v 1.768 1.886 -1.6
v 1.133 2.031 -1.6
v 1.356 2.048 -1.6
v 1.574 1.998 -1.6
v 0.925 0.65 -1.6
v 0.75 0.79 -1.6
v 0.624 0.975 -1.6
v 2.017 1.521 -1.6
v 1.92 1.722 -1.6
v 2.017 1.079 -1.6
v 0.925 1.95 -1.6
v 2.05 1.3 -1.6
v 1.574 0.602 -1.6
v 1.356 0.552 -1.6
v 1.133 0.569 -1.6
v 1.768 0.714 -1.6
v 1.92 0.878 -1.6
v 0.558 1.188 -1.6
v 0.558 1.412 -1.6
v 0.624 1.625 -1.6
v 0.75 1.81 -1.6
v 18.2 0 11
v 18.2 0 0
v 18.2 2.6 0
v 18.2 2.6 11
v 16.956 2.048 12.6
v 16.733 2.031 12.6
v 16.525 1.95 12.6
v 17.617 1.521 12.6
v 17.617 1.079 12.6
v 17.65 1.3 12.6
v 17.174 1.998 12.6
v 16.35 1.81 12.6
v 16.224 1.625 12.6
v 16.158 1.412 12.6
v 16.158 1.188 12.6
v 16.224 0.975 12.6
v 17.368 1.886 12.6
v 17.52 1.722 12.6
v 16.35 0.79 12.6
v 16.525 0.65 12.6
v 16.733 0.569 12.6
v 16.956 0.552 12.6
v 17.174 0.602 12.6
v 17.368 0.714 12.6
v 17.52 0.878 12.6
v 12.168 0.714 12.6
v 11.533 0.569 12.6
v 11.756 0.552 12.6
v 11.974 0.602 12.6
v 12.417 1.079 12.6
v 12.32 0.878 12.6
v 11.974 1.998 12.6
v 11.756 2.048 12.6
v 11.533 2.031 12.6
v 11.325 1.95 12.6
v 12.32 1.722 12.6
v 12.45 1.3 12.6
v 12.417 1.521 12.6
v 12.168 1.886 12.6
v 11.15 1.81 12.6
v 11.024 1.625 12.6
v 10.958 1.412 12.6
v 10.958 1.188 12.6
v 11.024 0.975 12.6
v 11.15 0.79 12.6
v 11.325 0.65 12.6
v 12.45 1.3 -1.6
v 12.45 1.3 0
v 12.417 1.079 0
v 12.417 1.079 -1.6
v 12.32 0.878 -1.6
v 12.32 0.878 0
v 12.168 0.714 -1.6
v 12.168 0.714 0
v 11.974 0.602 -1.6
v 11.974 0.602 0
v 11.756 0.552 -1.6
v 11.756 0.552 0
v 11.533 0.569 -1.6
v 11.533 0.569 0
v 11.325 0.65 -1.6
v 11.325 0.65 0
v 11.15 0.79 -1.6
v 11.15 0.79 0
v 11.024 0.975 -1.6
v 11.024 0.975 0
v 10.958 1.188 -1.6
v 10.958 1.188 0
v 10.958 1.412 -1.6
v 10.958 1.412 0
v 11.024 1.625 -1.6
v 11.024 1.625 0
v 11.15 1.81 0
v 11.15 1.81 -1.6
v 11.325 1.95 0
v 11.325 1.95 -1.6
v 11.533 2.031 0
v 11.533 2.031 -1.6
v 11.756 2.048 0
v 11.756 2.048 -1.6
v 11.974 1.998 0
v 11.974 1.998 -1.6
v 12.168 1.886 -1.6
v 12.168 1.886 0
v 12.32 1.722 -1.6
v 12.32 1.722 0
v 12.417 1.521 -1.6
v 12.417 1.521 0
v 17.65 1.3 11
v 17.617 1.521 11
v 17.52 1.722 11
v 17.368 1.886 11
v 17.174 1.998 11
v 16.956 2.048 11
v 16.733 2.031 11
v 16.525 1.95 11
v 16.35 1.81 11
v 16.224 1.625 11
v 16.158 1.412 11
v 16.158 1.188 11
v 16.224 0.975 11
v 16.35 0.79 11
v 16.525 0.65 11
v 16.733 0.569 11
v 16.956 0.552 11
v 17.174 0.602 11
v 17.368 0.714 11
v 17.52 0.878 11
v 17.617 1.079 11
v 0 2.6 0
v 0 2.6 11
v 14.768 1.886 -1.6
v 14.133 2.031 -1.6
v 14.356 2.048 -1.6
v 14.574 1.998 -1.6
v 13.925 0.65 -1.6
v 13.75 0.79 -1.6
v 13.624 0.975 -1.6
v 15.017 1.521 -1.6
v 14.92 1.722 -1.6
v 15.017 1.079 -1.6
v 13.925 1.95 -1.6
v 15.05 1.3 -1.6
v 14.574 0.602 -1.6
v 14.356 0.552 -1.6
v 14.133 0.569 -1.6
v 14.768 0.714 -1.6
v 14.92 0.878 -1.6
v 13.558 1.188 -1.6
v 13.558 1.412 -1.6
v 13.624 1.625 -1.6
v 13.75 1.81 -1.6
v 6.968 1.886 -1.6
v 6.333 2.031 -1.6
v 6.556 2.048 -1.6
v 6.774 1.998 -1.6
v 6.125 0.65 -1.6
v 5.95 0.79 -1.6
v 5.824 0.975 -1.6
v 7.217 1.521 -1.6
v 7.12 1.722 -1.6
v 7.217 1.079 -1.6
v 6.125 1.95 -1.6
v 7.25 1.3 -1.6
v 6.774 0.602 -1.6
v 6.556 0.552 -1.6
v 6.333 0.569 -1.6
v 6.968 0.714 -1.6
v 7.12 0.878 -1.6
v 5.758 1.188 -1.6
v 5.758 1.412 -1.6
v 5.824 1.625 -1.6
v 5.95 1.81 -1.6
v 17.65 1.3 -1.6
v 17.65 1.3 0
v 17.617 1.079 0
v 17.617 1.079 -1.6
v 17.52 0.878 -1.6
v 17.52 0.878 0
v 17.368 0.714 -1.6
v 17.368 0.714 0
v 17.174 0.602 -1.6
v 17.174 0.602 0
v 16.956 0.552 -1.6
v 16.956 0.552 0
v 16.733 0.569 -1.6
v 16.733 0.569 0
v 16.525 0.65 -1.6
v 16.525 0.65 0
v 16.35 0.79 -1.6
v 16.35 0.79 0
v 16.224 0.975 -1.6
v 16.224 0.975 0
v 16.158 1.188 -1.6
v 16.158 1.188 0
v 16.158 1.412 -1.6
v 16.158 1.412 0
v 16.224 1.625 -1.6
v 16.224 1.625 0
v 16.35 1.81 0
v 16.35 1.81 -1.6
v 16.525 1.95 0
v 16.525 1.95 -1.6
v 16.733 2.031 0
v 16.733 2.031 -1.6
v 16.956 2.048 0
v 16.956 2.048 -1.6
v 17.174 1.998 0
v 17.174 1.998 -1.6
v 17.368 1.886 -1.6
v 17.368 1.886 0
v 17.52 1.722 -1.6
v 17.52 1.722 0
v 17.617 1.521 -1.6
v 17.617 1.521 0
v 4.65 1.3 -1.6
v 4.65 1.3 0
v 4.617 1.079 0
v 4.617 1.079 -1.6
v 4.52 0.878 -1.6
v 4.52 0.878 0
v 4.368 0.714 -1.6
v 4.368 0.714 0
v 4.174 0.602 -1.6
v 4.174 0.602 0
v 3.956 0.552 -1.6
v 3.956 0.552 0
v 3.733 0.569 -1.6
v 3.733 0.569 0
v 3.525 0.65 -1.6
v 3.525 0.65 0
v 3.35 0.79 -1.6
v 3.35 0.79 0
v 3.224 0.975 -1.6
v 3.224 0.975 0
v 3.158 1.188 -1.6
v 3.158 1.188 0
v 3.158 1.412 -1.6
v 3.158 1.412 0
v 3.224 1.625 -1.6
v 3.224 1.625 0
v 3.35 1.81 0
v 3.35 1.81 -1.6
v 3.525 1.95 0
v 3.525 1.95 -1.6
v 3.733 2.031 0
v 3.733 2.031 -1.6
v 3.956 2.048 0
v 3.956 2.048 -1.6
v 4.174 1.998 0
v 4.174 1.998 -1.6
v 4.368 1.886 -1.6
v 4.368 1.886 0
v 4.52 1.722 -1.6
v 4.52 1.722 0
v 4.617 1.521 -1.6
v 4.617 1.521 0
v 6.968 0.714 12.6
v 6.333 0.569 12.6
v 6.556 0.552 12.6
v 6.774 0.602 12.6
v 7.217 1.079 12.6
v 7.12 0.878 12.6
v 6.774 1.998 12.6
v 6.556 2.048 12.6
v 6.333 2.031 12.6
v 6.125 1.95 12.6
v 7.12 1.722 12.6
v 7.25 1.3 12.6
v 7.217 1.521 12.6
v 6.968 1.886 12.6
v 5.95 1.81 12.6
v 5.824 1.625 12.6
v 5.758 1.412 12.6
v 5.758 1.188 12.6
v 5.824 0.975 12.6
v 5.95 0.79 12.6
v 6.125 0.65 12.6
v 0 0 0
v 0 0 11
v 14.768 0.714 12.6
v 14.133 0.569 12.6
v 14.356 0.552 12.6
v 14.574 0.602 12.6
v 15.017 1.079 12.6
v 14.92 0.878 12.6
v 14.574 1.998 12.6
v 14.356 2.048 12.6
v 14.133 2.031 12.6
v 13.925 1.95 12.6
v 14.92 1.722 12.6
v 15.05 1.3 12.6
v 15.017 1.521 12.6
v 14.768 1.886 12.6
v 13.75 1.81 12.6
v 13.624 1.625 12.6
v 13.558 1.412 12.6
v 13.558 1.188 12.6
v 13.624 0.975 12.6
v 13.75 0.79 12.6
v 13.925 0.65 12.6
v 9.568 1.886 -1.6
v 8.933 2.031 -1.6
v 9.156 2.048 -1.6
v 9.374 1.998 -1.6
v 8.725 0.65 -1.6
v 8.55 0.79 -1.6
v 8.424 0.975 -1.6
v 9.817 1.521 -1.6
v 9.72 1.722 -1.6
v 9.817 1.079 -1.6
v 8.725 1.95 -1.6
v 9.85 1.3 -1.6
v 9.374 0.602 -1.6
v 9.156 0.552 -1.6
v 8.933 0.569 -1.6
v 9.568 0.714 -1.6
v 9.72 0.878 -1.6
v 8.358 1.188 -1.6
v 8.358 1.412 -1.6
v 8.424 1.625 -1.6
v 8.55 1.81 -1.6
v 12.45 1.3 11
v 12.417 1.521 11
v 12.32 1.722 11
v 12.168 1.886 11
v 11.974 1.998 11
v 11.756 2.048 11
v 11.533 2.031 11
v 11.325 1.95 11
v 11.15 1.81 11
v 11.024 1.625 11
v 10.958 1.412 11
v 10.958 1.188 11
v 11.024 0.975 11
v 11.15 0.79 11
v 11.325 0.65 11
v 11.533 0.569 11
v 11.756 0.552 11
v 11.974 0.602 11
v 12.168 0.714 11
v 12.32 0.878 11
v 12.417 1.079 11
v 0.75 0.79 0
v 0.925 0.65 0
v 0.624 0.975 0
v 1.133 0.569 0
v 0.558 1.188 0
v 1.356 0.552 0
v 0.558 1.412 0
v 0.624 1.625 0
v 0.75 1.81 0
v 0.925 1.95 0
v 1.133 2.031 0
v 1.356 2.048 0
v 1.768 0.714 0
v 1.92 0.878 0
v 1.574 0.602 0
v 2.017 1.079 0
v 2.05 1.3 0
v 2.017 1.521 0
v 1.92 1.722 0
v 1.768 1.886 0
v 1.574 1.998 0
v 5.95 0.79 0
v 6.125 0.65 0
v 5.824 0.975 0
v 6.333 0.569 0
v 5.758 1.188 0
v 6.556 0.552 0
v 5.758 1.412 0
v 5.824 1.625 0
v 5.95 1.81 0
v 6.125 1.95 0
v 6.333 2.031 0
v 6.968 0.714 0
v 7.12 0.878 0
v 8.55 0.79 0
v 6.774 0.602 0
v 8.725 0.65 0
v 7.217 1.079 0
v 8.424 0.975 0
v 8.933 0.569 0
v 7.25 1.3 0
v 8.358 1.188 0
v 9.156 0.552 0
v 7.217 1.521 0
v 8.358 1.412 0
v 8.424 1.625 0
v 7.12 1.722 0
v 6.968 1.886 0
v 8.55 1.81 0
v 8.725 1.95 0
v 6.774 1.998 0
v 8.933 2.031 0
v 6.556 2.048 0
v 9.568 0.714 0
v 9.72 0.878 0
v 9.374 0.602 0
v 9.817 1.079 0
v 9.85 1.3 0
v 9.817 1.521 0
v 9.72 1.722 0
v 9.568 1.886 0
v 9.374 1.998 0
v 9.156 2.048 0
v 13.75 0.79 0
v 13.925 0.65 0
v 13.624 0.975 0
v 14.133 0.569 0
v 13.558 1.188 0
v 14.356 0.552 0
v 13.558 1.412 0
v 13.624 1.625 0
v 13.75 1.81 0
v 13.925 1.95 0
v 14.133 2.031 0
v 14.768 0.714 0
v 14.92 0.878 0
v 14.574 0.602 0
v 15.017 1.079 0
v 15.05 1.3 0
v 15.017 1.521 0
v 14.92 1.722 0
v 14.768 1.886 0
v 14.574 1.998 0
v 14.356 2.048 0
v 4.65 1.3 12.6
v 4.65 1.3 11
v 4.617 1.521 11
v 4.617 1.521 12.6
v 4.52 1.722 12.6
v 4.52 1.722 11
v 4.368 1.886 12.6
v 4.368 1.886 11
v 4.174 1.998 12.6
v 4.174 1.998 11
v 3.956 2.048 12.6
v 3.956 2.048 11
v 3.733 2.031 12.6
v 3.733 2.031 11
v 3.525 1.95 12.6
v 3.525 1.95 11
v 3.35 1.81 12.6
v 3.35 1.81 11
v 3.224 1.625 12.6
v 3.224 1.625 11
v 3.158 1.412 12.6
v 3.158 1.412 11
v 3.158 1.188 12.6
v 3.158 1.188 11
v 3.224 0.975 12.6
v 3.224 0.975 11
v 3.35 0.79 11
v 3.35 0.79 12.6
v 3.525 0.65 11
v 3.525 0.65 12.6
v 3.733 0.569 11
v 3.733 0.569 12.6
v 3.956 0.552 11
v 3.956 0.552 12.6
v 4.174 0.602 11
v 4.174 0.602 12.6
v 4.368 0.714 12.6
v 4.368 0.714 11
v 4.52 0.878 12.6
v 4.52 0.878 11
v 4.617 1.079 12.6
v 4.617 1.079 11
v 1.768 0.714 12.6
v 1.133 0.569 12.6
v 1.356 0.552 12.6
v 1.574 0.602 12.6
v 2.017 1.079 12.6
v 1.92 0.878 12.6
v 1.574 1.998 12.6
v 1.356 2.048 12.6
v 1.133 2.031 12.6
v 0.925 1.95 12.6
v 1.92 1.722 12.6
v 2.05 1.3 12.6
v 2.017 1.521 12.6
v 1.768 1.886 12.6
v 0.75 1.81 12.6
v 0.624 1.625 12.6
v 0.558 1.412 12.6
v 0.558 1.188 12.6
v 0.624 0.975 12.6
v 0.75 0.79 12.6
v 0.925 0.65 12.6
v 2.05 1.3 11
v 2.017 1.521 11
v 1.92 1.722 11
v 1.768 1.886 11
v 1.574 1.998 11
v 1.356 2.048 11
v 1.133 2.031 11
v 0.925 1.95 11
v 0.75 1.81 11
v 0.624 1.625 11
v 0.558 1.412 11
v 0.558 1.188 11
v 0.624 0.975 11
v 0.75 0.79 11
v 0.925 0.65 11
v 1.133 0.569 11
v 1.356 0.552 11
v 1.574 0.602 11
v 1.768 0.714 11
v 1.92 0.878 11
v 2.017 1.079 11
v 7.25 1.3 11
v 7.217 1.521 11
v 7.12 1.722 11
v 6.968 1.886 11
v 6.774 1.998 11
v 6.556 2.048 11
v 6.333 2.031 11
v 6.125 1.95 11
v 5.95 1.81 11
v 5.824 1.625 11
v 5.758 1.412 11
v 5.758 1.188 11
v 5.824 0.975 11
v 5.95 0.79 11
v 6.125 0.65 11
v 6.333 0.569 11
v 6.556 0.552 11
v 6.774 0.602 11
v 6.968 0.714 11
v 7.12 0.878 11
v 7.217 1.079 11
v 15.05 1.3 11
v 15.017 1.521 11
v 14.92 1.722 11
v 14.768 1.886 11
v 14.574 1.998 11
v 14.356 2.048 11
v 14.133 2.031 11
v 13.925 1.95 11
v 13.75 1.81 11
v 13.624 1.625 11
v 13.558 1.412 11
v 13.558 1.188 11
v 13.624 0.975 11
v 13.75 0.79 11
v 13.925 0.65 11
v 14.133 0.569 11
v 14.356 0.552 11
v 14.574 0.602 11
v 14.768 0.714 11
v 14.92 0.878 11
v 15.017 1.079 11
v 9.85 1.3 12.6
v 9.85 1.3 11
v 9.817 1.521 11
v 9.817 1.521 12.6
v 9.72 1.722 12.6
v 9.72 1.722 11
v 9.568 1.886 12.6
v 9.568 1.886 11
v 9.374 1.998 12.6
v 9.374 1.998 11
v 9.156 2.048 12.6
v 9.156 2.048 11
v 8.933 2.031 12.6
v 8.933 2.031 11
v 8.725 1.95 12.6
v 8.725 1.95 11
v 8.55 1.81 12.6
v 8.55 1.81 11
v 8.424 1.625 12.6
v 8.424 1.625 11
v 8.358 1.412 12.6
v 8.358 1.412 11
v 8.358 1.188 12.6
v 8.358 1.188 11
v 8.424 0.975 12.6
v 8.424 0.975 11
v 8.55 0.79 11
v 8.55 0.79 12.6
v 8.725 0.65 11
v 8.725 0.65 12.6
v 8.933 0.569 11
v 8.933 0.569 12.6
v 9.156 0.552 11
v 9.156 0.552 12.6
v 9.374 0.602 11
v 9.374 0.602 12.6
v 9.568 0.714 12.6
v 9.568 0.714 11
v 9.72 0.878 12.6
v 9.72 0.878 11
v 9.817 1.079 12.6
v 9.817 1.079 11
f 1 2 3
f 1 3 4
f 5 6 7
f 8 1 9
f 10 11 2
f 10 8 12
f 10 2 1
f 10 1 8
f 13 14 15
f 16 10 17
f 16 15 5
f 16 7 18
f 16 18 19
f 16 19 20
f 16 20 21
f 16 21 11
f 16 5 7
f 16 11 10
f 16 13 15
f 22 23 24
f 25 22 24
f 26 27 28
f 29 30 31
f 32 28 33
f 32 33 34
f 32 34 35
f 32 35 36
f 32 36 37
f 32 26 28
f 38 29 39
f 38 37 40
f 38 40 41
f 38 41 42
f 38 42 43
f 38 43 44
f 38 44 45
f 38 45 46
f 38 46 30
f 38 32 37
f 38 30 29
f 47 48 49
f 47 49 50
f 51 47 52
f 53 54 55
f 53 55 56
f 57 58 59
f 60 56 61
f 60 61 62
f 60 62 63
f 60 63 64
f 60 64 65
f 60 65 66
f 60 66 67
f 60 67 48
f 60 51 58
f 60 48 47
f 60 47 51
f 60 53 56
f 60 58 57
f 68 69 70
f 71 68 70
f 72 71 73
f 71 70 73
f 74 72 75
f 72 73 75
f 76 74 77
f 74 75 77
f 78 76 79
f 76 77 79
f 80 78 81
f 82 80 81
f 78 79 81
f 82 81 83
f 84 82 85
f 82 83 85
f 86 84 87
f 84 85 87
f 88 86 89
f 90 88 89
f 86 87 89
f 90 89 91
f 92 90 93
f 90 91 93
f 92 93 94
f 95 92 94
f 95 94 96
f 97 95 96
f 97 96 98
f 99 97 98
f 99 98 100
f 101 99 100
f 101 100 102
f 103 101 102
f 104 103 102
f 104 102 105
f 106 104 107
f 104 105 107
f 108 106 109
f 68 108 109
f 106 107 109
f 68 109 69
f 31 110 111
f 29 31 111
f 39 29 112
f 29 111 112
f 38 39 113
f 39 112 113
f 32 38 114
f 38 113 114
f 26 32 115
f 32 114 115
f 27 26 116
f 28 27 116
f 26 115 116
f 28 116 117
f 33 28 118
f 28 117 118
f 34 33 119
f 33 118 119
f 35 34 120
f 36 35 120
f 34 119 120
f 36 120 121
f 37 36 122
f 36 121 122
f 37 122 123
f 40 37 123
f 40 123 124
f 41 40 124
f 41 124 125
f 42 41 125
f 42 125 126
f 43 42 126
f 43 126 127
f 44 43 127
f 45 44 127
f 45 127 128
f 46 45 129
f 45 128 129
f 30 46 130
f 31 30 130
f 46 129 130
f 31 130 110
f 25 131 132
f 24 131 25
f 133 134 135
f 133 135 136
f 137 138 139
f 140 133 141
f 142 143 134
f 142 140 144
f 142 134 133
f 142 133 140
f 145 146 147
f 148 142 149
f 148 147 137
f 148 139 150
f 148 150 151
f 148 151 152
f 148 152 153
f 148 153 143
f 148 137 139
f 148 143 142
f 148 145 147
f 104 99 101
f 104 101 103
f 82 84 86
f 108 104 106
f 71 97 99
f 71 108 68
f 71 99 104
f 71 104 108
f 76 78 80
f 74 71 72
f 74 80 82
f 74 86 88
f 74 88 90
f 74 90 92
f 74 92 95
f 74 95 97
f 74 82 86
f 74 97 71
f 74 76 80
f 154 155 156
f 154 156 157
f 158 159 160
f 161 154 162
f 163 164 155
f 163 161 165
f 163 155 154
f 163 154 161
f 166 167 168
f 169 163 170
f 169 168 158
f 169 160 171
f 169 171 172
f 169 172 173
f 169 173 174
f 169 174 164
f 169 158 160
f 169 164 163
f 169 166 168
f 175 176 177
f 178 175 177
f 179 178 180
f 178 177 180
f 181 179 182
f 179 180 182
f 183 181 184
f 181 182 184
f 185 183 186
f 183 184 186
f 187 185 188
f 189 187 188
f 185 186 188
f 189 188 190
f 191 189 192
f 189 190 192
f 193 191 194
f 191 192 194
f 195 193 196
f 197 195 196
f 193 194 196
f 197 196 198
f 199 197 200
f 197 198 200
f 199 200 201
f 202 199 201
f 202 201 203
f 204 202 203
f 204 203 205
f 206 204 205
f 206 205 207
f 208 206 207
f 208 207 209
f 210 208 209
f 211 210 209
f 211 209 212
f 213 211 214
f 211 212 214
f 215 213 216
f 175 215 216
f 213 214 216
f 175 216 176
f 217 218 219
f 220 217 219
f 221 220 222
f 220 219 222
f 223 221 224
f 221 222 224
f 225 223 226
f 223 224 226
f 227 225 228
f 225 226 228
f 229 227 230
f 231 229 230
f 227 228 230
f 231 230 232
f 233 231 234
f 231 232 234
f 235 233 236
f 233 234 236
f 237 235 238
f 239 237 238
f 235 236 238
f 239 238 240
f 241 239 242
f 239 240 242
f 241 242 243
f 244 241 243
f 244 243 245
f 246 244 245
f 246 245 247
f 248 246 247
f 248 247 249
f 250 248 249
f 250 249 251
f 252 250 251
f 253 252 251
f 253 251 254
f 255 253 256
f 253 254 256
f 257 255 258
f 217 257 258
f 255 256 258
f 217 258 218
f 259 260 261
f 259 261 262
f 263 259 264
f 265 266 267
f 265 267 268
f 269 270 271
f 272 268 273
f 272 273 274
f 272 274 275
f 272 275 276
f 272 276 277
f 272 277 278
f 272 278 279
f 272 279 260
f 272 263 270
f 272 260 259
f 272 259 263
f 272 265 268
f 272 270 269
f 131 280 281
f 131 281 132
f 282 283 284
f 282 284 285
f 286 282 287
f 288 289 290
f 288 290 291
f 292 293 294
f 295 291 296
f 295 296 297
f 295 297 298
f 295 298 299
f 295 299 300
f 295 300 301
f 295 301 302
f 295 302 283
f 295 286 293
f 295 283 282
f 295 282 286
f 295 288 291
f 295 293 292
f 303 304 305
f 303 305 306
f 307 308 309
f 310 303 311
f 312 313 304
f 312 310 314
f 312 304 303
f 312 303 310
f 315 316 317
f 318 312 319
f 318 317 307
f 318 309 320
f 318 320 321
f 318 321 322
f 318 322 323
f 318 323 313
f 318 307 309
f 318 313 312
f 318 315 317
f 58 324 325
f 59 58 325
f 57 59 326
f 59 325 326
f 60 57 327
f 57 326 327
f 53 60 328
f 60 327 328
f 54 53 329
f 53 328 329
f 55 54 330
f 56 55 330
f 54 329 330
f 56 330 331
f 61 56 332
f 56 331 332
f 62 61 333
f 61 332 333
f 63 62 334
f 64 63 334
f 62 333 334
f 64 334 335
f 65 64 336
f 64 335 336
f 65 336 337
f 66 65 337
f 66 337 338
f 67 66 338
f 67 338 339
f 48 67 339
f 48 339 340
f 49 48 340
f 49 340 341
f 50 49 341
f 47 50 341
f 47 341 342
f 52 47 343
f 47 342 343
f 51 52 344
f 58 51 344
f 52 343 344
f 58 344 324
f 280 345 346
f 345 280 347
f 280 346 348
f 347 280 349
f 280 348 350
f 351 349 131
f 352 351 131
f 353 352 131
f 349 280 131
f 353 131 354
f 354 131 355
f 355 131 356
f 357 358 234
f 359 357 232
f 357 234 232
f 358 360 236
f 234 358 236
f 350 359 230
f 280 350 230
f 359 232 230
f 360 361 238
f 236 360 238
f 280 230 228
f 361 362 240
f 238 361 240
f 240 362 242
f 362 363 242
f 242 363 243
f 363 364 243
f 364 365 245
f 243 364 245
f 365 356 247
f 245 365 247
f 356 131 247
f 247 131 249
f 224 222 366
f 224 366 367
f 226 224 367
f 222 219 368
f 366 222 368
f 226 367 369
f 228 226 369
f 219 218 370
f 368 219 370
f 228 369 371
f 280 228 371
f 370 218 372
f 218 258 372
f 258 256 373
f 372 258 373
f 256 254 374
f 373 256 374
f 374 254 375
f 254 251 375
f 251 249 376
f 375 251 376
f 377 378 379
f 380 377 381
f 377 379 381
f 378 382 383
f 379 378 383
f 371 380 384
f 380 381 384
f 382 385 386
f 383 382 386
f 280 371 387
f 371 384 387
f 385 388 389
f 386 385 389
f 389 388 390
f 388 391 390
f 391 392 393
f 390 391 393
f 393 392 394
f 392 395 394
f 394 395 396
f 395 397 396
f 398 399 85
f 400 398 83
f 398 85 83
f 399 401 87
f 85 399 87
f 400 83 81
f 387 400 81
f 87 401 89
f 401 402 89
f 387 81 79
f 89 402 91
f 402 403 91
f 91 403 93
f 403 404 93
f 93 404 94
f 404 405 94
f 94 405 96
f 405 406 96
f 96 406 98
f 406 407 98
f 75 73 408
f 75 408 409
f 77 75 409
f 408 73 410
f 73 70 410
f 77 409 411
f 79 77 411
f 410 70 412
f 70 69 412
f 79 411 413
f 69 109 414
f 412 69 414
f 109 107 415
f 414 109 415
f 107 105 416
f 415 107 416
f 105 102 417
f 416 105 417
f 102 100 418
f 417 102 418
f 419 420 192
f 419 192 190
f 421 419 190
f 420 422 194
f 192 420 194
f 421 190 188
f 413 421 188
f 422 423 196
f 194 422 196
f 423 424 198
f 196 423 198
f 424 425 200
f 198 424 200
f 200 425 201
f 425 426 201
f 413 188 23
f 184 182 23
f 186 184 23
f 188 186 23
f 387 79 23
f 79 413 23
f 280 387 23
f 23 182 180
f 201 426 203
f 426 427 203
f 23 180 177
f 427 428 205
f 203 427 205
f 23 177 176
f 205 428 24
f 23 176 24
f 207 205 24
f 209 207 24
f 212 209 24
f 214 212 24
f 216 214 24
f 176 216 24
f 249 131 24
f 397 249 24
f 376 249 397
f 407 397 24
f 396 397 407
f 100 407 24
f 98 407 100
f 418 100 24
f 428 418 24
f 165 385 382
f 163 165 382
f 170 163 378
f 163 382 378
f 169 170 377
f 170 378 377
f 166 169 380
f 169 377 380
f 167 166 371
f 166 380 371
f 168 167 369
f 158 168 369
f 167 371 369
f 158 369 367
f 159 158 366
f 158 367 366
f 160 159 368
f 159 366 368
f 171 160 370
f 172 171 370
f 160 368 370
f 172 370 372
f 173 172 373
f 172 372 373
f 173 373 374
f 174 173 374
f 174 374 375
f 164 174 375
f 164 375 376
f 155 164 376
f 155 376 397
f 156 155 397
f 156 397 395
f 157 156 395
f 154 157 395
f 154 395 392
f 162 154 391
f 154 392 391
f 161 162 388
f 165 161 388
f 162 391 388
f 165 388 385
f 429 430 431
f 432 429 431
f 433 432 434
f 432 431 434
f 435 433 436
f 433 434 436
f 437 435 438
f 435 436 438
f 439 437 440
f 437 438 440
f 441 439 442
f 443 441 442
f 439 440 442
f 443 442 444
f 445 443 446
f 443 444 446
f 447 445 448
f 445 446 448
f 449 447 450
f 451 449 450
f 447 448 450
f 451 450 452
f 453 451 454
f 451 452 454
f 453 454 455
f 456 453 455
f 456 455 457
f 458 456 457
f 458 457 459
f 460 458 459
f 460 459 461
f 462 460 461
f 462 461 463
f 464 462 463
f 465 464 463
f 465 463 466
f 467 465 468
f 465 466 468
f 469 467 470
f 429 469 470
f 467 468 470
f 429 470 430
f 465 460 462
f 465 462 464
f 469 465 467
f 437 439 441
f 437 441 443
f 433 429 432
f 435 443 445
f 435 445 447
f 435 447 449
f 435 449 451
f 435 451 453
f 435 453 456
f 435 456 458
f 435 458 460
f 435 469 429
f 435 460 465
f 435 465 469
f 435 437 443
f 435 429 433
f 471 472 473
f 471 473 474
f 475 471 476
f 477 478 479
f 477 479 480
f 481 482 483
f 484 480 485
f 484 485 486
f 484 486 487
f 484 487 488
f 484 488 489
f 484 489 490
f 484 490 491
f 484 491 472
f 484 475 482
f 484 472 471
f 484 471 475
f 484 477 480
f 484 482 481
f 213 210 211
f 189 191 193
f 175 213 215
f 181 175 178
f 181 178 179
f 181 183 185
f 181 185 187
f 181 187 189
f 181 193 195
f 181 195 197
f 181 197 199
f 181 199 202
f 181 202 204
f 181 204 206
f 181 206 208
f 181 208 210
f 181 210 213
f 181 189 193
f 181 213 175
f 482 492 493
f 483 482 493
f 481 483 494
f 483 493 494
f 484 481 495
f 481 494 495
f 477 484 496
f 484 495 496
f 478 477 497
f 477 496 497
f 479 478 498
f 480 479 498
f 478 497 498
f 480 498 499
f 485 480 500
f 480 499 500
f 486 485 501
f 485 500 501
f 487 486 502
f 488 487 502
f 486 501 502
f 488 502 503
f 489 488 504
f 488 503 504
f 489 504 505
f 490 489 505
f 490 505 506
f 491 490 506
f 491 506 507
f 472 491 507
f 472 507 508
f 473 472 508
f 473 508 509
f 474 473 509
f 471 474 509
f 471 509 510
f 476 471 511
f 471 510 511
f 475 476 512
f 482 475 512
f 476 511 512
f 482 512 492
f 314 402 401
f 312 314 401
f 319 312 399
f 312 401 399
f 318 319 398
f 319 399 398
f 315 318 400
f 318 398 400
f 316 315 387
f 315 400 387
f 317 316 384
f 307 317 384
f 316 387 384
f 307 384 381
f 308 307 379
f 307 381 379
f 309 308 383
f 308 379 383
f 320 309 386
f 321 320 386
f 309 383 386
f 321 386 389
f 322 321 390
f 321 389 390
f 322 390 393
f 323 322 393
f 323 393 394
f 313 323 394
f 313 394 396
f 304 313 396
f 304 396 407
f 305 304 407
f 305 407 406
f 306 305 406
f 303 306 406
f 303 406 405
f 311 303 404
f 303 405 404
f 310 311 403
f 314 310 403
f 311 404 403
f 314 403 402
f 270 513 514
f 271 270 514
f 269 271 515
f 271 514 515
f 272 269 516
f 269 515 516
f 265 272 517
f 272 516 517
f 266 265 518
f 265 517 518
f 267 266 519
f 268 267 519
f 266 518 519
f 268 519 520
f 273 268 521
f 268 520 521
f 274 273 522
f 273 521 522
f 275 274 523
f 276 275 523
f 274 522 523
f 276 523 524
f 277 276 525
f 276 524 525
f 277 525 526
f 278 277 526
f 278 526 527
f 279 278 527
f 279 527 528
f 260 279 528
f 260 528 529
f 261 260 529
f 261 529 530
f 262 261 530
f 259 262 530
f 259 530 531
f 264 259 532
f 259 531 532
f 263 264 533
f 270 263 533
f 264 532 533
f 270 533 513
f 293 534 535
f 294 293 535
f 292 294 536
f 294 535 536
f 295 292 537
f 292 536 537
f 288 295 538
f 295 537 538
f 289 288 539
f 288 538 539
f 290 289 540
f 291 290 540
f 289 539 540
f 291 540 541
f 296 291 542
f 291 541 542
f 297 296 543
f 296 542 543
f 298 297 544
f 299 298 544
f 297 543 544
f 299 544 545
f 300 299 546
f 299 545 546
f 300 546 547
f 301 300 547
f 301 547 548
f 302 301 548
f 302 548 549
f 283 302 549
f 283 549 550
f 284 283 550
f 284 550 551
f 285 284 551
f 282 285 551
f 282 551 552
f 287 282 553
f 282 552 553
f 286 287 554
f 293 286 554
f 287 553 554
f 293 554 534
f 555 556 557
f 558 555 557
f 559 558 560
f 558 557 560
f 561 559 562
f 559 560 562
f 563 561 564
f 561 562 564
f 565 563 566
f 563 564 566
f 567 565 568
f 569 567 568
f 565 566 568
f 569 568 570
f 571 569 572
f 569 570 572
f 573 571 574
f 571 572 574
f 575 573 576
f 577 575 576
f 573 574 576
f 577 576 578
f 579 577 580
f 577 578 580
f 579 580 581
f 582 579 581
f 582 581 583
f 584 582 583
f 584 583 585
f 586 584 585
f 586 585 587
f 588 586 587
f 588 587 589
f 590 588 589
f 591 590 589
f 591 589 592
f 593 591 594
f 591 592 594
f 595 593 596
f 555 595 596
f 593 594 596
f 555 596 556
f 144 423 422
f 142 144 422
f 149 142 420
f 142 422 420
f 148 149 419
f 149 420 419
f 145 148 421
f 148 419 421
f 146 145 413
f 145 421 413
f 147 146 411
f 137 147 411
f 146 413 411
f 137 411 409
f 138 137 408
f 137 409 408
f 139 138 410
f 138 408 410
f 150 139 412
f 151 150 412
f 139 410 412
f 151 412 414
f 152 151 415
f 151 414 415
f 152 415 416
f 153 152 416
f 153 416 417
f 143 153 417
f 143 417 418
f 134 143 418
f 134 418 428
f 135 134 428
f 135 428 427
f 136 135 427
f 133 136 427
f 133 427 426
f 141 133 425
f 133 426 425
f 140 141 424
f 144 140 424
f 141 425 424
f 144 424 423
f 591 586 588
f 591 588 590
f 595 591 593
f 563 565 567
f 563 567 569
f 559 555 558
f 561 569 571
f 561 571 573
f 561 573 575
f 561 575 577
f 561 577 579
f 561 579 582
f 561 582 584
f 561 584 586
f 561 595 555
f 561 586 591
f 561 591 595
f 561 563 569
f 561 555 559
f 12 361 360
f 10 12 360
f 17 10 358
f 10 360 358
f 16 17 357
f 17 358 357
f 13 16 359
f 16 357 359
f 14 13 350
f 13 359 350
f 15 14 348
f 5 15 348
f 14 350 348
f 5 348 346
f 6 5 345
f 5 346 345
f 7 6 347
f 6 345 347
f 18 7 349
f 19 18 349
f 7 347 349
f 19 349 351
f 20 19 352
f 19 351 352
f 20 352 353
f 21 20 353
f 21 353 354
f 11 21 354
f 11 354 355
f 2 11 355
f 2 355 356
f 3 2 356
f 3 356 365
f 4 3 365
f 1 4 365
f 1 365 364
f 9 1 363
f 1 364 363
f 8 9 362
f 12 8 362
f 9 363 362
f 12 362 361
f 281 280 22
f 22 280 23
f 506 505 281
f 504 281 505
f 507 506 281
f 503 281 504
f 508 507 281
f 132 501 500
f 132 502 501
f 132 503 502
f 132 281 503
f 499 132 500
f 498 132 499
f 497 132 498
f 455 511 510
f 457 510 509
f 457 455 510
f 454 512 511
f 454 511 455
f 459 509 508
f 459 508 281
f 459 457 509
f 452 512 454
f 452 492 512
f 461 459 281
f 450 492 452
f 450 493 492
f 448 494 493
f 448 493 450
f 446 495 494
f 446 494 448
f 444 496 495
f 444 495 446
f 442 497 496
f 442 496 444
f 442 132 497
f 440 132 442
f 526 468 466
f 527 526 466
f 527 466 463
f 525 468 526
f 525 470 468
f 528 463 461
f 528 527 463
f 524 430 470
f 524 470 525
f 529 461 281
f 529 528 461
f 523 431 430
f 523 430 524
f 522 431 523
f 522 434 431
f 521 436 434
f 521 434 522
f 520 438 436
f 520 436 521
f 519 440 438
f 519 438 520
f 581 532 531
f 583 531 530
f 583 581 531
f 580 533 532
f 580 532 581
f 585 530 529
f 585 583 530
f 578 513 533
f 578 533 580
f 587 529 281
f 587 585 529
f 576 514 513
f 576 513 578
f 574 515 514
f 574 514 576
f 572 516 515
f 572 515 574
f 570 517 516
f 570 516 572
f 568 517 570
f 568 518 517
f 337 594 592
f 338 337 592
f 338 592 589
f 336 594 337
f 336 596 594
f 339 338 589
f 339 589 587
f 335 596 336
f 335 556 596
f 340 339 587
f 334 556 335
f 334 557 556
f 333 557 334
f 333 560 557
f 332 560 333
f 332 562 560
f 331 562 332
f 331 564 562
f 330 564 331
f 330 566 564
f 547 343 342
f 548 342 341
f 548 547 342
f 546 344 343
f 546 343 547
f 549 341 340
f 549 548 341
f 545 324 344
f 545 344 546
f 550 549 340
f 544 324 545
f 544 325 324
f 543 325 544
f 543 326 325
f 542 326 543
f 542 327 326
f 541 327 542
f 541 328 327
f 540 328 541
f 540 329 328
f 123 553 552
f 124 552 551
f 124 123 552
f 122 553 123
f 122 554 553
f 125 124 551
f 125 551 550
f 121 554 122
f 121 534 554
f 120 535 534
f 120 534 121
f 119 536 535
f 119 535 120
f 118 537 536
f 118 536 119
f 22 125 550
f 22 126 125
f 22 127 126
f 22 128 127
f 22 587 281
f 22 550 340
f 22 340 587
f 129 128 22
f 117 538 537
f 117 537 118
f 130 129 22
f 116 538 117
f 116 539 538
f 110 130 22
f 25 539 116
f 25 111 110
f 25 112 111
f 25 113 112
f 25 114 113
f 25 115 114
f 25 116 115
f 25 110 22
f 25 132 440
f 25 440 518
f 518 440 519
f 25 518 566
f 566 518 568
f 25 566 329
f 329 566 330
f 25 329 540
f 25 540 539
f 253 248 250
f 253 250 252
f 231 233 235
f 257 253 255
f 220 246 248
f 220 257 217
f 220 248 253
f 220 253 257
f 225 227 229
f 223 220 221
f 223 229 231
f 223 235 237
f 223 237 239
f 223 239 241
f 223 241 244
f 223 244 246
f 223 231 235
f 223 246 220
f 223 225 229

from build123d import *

# Parameters (mm, degrees)
F0_W     = 18.2
F0_H     = 2.6
F1_DEPTH = 11
F2_R     = 0.75
F3_DEPTH = 1.6
F4_R     = 0.75
F5_DEPTH = 1.6


with BuildPart() as f1:
    # F0 (on Top) → F1 (new body)
    with BuildSketch(Plane.XY):
        with Locations((9.1, 1.3)):
            Rectangle(F0_W, F0_H)
    extrude(amount=F1_DEPTH)

    # F2 (on face) → F3 (join)
    with BuildSketch(Plane.XY.offset(11)):
        with Locations((9.1, 1.3)):
            Circle(F2_R)
        with Locations((1.3, 1.3)):
            Circle(F2_R)
        with Locations((3.9, 1.3)):
            Circle(F2_R)
        with Locations((6.5, 1.3)):
            Circle(F2_R)
        with Locations((11.7, 1.3)):
            Circle(F2_R)
        with Locations((14.3, 1.3)):
            Circle(F2_R)
        with Locations((16.9, 1.3)):
            Circle(F2_R)
    extrude(amount=F3_DEPTH)

    # F4 (on face) → F5 (join)
    with BuildSketch(Plane(origin=(0, 0, 0), x_dir=(1, 0, 0), z_dir=(0, 0, -1))):
        with Locations((9.1, -1.3)):
            Circle(F4_R)
        with Locations((1.3, -1.3)):
            Circle(F4_R)
        with Locations((3.9, -1.3)):
            Circle(F4_R)
        with Locations((6.5, -1.3)):
            Circle(F4_R)
        with Locations((11.7, -1.3)):
            Circle(F4_R)
        with Locations((14.3, -1.3)):
            Circle(F4_R)
        with Locations((16.9, -1.3)):
            Circle(F4_R)
    extrude(amount=F5_DEPTH)


solid = f1.part
